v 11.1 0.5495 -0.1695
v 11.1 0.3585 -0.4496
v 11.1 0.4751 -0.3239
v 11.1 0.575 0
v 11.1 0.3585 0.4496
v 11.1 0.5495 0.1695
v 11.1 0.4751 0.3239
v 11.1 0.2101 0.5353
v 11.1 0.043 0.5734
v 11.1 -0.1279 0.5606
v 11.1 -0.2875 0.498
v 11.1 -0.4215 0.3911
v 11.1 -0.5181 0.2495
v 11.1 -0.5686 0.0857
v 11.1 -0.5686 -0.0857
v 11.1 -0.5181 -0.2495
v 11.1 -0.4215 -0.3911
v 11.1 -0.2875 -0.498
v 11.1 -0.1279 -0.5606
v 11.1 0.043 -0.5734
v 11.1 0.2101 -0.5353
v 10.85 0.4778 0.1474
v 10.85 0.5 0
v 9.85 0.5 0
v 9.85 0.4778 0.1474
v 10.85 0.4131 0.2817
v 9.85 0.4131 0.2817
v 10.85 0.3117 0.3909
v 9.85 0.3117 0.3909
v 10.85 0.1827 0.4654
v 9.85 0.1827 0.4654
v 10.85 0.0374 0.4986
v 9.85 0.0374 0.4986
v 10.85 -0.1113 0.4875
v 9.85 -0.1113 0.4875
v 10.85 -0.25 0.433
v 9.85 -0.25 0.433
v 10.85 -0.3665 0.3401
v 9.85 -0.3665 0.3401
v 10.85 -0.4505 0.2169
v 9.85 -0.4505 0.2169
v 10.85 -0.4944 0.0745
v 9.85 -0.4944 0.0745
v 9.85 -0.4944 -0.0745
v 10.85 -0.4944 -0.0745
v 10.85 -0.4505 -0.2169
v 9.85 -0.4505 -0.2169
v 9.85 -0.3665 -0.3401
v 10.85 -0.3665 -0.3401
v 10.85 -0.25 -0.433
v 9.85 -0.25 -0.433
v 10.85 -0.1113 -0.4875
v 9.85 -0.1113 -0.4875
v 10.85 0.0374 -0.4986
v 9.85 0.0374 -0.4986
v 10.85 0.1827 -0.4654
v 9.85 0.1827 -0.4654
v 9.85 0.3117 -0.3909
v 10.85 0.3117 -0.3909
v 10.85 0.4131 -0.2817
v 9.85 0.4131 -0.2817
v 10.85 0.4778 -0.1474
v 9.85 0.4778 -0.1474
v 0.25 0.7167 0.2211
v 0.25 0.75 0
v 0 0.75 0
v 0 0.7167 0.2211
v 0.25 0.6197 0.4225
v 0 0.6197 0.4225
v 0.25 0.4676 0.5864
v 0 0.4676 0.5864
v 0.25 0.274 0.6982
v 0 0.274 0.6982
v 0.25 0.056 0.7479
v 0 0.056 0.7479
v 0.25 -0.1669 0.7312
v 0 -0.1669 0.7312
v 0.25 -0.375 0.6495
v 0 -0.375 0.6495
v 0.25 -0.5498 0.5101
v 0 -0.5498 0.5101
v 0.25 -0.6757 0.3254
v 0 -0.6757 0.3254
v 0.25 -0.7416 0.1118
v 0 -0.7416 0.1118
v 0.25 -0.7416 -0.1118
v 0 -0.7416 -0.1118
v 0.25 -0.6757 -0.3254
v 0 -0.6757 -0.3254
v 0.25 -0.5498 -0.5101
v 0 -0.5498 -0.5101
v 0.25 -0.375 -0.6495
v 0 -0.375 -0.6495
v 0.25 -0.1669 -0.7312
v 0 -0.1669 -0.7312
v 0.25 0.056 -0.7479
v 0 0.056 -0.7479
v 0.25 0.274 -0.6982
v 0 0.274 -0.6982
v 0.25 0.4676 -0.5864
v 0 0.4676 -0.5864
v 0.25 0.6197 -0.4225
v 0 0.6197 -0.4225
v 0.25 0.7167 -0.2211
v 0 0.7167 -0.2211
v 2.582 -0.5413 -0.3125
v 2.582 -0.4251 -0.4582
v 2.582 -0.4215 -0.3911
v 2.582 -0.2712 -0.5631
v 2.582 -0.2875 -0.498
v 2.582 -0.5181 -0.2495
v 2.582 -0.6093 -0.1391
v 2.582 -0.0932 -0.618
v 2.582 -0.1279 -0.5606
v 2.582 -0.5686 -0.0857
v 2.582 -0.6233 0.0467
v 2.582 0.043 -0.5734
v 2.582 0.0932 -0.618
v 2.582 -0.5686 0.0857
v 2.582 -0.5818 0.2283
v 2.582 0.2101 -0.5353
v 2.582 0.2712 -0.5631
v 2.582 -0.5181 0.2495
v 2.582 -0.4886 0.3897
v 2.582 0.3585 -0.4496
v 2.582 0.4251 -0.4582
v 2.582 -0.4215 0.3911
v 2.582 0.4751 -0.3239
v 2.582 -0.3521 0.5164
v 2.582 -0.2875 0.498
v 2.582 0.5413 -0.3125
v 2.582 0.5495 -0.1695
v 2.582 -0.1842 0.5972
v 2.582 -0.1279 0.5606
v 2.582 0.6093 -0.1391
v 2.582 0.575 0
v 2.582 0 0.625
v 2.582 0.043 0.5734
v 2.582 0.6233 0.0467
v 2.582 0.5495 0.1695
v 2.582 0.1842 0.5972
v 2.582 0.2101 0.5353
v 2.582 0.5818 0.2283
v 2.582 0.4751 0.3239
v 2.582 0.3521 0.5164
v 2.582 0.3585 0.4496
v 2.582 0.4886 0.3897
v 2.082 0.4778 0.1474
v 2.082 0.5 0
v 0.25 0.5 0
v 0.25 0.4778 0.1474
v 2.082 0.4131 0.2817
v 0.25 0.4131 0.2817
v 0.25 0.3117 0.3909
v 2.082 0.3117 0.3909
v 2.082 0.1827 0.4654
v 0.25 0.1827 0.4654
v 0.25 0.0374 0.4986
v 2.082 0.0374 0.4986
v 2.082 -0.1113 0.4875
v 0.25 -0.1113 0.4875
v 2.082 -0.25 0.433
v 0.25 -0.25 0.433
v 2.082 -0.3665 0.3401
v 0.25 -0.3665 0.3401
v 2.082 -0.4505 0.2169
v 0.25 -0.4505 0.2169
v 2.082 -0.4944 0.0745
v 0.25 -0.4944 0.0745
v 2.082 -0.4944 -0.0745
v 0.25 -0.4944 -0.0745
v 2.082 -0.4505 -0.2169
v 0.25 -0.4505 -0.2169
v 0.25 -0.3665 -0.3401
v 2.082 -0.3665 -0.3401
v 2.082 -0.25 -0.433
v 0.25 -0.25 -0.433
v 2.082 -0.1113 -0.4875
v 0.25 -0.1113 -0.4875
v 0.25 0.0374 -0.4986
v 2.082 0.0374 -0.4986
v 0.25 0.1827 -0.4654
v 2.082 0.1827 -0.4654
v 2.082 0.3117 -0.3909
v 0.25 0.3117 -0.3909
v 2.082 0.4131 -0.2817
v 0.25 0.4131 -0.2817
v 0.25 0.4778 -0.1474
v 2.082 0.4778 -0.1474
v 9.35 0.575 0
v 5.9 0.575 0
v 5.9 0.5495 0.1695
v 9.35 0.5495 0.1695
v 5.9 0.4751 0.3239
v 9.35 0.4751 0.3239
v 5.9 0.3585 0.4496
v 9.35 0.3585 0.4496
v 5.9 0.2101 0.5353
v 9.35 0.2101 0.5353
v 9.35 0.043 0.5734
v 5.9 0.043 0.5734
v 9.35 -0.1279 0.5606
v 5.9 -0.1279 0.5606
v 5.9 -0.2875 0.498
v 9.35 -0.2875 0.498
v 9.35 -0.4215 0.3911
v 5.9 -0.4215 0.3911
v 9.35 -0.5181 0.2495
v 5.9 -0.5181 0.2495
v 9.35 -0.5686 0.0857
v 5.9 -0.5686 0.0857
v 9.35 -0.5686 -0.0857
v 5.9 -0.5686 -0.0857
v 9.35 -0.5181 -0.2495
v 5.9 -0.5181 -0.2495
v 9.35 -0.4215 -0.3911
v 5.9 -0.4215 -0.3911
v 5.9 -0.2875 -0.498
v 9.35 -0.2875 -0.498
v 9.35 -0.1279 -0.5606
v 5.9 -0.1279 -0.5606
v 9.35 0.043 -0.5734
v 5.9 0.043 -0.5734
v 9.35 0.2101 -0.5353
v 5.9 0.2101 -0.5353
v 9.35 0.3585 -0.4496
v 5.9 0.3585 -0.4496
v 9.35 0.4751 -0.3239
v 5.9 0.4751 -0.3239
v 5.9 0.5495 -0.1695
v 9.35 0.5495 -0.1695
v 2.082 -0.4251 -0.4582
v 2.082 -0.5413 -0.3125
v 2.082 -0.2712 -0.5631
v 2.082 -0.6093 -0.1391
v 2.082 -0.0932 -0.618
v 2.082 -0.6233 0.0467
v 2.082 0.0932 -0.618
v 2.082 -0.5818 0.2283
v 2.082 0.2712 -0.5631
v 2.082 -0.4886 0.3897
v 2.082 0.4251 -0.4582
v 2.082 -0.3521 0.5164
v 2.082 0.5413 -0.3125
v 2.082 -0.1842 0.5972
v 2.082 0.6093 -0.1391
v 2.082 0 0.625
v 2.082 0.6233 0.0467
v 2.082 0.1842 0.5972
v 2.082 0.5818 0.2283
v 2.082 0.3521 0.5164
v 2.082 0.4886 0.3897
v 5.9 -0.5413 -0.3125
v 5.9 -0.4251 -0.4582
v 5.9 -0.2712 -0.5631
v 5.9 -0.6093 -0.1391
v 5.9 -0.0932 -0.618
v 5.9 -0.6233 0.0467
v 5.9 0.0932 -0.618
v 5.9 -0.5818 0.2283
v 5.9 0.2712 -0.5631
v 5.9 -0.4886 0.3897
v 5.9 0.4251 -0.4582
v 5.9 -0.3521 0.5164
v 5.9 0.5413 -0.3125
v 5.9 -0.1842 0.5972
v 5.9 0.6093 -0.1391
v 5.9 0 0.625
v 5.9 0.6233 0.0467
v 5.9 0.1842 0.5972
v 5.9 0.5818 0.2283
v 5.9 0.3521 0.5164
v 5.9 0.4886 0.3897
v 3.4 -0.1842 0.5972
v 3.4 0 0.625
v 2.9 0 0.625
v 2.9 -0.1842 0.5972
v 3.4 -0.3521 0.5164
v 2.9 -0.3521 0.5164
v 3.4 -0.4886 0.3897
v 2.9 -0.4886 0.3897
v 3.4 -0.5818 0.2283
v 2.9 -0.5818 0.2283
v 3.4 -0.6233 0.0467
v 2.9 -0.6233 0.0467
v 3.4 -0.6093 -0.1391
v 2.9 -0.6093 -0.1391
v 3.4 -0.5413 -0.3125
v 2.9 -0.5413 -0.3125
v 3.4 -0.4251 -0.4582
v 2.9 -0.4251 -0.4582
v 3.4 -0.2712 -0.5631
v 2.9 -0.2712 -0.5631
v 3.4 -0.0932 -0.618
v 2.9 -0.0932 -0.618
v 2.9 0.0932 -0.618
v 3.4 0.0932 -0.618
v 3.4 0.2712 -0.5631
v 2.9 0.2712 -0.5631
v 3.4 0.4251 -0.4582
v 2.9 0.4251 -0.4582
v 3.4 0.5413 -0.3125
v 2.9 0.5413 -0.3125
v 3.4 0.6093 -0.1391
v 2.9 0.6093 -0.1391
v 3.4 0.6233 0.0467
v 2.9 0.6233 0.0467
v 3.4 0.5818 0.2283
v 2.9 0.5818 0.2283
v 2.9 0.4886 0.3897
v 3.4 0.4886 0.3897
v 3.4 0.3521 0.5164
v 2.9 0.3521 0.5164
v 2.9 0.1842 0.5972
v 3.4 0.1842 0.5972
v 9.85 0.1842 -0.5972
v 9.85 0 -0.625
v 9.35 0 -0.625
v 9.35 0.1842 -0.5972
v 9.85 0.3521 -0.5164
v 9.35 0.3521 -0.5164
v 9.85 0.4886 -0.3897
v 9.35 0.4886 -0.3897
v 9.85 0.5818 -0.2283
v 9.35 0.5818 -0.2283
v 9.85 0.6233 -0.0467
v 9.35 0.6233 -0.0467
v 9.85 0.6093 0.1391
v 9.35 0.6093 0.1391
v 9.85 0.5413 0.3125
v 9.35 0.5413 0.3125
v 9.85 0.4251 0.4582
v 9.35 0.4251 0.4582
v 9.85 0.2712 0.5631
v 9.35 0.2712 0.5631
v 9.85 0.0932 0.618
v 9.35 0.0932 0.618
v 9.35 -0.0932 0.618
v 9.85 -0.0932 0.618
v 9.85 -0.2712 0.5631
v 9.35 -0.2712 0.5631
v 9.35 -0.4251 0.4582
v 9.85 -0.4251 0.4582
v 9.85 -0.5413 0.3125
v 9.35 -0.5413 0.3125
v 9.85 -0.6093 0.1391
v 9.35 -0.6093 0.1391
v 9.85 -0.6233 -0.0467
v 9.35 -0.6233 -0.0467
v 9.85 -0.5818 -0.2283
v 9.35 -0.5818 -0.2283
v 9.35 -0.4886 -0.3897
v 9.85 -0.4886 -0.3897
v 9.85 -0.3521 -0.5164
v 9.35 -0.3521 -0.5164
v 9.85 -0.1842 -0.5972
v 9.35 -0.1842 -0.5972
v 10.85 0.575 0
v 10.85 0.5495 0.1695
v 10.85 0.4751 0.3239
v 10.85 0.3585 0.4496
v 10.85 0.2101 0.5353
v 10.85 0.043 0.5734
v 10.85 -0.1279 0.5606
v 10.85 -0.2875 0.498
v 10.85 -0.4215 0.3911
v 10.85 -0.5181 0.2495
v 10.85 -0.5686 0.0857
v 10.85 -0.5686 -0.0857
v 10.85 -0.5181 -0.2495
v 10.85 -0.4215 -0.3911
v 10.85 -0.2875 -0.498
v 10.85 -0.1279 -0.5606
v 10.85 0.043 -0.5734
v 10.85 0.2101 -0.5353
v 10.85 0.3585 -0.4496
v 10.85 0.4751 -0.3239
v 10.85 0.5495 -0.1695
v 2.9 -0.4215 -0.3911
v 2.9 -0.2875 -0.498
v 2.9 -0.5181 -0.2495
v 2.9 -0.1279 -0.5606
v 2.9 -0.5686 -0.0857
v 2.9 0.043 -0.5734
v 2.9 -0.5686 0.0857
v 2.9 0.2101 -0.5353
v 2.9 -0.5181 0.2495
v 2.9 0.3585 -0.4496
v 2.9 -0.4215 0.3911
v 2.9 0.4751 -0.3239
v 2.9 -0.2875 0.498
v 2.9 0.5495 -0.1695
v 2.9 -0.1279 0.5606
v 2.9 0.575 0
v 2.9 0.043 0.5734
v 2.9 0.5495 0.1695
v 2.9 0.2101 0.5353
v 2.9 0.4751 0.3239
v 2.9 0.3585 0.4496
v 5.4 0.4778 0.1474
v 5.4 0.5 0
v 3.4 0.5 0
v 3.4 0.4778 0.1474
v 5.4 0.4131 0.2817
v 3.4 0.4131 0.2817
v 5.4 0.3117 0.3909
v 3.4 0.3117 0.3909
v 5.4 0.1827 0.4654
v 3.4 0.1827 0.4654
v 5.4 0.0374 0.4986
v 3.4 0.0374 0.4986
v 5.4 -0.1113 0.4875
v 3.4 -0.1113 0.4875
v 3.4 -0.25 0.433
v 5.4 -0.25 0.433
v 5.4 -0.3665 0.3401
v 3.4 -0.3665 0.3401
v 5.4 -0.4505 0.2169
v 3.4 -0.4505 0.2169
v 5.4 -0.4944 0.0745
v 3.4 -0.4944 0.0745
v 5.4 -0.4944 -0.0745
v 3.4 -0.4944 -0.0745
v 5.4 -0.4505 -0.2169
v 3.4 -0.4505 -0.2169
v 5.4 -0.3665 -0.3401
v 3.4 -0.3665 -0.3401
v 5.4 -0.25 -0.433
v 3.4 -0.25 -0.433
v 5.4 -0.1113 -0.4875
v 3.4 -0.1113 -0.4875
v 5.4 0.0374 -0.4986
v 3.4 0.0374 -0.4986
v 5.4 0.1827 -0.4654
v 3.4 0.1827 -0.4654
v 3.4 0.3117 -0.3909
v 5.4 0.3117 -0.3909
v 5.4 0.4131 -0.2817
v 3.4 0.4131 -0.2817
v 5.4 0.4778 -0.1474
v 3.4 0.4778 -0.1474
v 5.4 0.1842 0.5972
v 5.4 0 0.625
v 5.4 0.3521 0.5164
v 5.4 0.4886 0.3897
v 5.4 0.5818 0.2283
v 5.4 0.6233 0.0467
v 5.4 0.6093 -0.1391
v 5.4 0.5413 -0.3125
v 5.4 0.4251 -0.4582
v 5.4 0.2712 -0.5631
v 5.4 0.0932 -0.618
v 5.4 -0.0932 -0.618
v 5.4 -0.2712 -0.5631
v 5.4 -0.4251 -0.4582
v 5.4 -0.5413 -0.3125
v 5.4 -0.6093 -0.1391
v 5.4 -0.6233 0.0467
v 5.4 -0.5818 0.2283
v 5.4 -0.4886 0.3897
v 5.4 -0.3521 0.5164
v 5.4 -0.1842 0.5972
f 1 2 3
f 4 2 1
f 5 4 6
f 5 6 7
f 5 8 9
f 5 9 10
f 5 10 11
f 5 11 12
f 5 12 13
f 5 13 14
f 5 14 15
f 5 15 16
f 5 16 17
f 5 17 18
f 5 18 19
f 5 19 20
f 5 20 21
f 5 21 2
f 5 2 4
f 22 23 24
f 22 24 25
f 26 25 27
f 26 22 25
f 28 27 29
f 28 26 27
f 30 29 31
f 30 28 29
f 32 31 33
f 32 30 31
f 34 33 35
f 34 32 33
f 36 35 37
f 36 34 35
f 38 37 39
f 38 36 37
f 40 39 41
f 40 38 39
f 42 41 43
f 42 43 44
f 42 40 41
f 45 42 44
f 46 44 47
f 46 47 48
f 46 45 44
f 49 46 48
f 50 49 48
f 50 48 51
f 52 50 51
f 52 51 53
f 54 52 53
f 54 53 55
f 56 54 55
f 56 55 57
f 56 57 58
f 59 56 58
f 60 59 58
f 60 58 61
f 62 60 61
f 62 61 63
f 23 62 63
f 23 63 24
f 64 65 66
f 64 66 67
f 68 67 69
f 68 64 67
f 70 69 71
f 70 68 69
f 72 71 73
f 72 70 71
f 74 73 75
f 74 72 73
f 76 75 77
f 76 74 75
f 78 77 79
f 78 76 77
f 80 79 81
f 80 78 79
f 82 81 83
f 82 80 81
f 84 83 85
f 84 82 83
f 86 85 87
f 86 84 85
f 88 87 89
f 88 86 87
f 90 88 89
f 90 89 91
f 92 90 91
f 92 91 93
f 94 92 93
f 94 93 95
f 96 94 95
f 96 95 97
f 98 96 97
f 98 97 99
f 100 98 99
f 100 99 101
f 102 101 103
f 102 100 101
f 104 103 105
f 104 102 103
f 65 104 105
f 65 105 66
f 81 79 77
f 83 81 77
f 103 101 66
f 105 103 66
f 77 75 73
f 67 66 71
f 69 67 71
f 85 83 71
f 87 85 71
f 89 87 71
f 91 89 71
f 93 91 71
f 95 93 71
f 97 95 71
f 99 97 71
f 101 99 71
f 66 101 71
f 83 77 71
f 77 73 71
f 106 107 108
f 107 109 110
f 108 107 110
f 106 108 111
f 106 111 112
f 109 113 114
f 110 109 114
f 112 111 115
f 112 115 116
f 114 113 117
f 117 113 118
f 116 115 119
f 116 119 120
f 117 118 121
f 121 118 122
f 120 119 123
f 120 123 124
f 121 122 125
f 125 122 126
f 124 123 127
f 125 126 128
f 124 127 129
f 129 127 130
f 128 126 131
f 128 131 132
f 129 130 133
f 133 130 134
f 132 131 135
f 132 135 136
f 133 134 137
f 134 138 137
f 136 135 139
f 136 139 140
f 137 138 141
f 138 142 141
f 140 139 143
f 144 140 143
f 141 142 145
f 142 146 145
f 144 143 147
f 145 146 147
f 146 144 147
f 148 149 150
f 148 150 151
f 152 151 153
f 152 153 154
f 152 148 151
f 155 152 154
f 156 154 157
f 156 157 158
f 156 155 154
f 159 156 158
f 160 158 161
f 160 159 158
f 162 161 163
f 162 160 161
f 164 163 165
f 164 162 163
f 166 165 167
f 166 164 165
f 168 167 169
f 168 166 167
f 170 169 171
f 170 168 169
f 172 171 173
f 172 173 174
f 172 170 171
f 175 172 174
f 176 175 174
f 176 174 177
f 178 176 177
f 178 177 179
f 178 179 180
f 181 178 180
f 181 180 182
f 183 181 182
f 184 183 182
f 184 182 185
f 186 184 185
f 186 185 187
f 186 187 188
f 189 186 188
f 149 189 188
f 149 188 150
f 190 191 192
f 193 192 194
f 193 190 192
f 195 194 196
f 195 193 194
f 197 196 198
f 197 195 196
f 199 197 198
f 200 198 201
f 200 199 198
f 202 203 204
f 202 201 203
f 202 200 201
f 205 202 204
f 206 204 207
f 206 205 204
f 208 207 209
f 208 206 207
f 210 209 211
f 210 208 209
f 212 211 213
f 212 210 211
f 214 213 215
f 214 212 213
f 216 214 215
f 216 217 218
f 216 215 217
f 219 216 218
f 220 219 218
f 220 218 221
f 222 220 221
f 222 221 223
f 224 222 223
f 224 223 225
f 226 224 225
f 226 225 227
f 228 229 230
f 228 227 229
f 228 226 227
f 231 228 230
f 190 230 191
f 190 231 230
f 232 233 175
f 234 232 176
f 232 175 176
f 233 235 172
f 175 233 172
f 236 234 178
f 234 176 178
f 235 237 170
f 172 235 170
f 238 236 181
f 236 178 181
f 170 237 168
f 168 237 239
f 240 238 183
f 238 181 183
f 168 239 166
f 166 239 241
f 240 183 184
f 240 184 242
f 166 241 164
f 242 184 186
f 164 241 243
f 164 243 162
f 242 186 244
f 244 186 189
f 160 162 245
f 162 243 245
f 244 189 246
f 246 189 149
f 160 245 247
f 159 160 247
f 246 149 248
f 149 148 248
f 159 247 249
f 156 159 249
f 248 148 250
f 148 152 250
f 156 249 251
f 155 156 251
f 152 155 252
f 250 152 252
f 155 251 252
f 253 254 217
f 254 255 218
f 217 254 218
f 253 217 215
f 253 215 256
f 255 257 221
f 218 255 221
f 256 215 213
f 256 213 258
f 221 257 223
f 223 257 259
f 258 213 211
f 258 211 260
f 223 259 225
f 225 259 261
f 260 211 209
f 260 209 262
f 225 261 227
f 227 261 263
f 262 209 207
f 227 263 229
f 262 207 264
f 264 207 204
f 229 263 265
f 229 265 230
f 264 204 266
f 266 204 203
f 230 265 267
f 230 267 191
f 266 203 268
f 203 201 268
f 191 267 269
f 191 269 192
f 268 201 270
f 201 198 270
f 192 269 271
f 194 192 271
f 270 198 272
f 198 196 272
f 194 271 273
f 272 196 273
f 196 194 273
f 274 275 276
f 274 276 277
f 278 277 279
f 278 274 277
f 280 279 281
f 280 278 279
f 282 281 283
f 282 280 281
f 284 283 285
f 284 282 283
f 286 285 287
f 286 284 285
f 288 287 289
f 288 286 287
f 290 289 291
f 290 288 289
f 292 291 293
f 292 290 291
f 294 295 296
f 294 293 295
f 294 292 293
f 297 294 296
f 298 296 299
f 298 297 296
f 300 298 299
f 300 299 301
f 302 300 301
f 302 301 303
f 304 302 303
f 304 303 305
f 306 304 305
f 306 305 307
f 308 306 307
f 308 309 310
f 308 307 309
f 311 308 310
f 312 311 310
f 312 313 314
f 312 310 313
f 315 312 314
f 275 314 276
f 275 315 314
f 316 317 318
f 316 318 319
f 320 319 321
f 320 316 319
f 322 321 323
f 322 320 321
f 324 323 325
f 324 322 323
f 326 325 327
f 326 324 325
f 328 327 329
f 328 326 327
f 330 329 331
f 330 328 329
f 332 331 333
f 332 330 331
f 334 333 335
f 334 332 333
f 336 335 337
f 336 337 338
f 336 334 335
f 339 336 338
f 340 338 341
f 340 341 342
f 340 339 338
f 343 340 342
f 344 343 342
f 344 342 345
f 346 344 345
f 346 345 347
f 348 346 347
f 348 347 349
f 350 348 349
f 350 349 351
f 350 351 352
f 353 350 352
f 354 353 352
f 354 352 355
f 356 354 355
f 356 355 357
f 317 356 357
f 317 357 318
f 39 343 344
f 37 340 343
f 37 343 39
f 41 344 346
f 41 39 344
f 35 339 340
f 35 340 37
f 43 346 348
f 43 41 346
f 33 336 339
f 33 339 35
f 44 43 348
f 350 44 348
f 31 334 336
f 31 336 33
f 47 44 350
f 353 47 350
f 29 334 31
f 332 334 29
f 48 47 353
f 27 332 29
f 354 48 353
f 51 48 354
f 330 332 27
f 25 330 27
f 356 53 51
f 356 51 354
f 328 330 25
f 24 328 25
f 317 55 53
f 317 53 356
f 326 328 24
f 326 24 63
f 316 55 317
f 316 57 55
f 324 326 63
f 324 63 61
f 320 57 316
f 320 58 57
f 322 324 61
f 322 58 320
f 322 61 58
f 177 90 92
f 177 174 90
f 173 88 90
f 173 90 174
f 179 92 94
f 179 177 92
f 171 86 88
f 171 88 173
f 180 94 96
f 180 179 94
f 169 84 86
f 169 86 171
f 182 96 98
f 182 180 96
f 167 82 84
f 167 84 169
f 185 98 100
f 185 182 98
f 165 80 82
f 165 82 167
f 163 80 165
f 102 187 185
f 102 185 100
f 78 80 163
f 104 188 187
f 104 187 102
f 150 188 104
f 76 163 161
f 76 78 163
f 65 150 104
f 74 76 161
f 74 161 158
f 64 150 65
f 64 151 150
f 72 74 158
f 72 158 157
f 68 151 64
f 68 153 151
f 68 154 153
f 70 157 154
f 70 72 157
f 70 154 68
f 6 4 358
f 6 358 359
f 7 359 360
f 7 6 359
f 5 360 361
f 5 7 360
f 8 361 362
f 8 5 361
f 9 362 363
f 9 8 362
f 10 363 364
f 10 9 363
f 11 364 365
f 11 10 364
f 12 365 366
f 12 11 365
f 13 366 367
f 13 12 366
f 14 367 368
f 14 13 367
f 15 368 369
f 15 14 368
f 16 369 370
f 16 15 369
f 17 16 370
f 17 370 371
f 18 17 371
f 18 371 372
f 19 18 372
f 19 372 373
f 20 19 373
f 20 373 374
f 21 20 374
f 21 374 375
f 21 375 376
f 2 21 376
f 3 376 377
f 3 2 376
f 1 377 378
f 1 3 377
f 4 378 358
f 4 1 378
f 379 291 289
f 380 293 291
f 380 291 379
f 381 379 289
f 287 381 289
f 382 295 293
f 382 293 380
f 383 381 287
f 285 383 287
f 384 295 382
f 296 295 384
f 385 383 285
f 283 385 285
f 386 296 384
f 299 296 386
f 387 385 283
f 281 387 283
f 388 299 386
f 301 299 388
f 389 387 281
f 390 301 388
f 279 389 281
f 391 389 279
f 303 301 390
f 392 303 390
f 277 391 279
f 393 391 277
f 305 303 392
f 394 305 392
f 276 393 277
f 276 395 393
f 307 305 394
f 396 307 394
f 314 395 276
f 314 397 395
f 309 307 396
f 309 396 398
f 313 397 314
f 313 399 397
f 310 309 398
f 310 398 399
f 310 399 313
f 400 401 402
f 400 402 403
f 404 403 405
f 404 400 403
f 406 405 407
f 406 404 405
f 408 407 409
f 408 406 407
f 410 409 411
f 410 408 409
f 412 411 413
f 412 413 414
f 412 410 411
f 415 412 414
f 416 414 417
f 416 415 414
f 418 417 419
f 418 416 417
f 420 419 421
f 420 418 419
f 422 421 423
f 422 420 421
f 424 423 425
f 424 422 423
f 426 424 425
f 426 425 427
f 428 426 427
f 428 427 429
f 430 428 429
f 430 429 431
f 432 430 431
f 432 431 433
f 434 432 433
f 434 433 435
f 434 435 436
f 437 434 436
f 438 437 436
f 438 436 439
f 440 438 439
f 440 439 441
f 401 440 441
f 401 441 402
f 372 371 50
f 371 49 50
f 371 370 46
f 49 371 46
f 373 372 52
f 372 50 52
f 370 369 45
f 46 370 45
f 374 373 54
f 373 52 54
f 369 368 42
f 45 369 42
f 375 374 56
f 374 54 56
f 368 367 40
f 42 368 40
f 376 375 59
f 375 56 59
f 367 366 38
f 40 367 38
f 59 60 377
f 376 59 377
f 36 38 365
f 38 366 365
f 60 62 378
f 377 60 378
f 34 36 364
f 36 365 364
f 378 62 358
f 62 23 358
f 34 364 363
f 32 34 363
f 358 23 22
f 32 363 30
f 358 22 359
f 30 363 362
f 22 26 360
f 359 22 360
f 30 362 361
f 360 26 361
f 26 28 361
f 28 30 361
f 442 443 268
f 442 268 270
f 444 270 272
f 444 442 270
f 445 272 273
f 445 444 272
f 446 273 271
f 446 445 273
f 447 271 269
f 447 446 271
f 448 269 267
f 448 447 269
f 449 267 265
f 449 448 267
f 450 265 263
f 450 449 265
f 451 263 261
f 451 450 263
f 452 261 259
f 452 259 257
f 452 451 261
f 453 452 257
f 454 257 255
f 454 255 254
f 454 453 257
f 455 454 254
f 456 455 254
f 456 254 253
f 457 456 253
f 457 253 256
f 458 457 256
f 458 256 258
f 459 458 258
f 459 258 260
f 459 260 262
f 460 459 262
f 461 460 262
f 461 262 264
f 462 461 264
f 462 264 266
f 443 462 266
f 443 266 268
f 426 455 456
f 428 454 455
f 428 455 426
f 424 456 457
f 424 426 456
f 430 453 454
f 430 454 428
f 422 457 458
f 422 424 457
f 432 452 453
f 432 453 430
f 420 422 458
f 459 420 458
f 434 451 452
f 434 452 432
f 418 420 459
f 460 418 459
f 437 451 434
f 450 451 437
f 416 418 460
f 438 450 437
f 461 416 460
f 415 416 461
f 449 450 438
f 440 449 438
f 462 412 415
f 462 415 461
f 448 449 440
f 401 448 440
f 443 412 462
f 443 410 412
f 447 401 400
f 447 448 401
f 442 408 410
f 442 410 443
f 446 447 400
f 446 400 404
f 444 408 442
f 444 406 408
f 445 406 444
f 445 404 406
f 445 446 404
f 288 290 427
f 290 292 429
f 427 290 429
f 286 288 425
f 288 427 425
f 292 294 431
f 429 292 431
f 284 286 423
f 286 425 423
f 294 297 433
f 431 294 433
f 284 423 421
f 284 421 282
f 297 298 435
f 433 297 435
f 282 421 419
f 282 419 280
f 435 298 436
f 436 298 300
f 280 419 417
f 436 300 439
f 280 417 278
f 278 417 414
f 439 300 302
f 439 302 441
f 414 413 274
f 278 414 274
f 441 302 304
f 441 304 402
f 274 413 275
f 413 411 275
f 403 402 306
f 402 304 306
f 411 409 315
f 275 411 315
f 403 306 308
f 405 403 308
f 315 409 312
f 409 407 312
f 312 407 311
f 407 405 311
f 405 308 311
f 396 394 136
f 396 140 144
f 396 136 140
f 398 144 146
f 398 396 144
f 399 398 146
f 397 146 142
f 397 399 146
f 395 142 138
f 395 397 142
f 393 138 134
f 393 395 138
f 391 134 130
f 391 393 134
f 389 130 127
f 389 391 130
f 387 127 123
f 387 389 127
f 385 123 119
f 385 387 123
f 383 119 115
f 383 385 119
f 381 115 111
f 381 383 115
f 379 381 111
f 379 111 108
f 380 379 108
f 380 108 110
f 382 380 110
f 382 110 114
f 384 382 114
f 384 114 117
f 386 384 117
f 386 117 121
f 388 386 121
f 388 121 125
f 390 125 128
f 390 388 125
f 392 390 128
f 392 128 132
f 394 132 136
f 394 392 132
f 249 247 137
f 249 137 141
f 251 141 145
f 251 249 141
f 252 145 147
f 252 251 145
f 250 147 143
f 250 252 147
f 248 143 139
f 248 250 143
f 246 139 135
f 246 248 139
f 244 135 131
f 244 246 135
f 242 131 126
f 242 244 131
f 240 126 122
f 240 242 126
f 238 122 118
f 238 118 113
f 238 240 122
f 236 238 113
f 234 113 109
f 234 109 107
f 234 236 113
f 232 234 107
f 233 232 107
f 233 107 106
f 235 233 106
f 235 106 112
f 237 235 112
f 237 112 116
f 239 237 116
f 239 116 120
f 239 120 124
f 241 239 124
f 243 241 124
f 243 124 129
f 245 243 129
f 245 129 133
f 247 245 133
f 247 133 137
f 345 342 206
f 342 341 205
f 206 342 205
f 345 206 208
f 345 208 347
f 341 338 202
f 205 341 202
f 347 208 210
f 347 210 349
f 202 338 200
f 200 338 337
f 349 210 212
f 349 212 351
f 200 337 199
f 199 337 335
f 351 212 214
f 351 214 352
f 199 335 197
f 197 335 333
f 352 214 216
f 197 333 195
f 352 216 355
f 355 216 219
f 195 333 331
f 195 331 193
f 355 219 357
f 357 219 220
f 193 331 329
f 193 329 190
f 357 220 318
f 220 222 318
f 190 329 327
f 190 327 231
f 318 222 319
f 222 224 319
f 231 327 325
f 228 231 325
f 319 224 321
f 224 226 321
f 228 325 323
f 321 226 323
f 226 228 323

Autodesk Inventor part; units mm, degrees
ref_plane "Start Plane" through (0, 0, 0) normal (1, 0, 0) x (0, 1, 0)
ref_plane "XZ Plane" through (0, 0, 0) normal (0, 1, 0) x (-1, 0, 0)
sketch "Main Sketch" plane through (0, 0, 0) normal (0, 0, 1) x (1, 0, 0)
  line L0 (0, 0) -> (11.1, 0)
  line L1 (0, 0) -> (0, 0.75)
  line L2 (0, 0.75) -> (0.25, 0.75)
  line L3 (0.25, 0.5) -> (2.082, 0.5)
  line L4 (2.082, 0.575) -> (3.4, 0.575)
  line L5 (3.4, 0.5) -> (5.4, 0.5)
  line L6 (5.4, 0.575) -> (9.85, 0.575)
  line L7 (9.85, 0.5) -> (10.85, 0.5)
  line L8 (11.1, 0.575) -> (11.1, 0)
  line L9 (10.85, 0.575) -> (11.1, 0.575)
  line L10 (0.25, 0.75) -> (0.25, 0.5)
  line L11 (2.082, 0.5) -> (2.082, 0.575)
  line L12 (3.4, 0.575) -> (3.4, 0.5)
  line L13 (5.4, 0.5) -> (5.4, 0.575)
  line L14 (9.85, 0.575) -> (9.85, 0.5)
  line L15 (10.85, 0.5) -> (10.85, 0.575)
  dimension "d3" = 1.5
  dimension "d4" = 1
  dimension "d5" = 1.15
  dimension "d6" = 1
  dimension "d7" = 1.15
  dimension "d8" = 1
  dimension "d9" = 1.15
revolve "Revolution1" add sketch "Main Sketch" angle 360 about axis through (0, 0, 0) along (1, 0, 0)
ref_plane "Work Plane1" through (2.082, 0, 0) normal (-1, 0, 0) x (0, 0, 1)
sketch "Sketch3" plane through (2.082, 0, 0) normal (-1, 0, 0) x (0, 0, 1)
  circle A0 centre (0, 0) radius 0.575 projected
  circle A1 centre (0, 0) radius 0.75 projected
  circle A2 centre (0, 0) radius 0.625
  dimension "d13" = 1.25
extrude "Extrusion1" add sketch "Sketch3" against normal blind 0.5 contours A2
ref_plane "Work Plane2" through (3.4, 0, 0) normal (-1, 0, 0) x (0, 0, 1)
sketch "Sketch4" plane through (3.4, 0, 0) normal (-1, 0, 0) x (0, 0, 1)
  circle A0 centre (0, 0) radius 0.5 projected
  circle A1 centre (0, 0) radius 0.575 projected
  circle A2 centre (0, 0) radius 0.625
  dimension "d17" = 1.25
extrude "Extrusion2" add sketch "Sketch4" along normal blind 0.5 contours A2
sketch "Sketch5" plane through (5.4, 0, 0) normal (-1, 0, 0) x (0, 0, 1)
  circle A0 centre (0, 0) radius 0.575 projected
  circle A1 centre (0, 0) radius 0.625
  dimension "d20" = 1.25
extrude "Extrusion3" add sketch "Sketch5" against normal blind 0.5
sketch "Sketch6" plane through (9.85, 0, 0) normal (1, 0, 0) x (0, 0, -1)
  circle A0 centre (0, 0) radius 0.625
  circle A1 centre (0, 0) radius 0.575 projected
  dimension "d23" = 1.25
extrude "Extrusion4" add sketch "Sketch6" against normal blind 0.5
equation "\"Length\" = 11.1"
properties part number "Shaft" material "Steel"
